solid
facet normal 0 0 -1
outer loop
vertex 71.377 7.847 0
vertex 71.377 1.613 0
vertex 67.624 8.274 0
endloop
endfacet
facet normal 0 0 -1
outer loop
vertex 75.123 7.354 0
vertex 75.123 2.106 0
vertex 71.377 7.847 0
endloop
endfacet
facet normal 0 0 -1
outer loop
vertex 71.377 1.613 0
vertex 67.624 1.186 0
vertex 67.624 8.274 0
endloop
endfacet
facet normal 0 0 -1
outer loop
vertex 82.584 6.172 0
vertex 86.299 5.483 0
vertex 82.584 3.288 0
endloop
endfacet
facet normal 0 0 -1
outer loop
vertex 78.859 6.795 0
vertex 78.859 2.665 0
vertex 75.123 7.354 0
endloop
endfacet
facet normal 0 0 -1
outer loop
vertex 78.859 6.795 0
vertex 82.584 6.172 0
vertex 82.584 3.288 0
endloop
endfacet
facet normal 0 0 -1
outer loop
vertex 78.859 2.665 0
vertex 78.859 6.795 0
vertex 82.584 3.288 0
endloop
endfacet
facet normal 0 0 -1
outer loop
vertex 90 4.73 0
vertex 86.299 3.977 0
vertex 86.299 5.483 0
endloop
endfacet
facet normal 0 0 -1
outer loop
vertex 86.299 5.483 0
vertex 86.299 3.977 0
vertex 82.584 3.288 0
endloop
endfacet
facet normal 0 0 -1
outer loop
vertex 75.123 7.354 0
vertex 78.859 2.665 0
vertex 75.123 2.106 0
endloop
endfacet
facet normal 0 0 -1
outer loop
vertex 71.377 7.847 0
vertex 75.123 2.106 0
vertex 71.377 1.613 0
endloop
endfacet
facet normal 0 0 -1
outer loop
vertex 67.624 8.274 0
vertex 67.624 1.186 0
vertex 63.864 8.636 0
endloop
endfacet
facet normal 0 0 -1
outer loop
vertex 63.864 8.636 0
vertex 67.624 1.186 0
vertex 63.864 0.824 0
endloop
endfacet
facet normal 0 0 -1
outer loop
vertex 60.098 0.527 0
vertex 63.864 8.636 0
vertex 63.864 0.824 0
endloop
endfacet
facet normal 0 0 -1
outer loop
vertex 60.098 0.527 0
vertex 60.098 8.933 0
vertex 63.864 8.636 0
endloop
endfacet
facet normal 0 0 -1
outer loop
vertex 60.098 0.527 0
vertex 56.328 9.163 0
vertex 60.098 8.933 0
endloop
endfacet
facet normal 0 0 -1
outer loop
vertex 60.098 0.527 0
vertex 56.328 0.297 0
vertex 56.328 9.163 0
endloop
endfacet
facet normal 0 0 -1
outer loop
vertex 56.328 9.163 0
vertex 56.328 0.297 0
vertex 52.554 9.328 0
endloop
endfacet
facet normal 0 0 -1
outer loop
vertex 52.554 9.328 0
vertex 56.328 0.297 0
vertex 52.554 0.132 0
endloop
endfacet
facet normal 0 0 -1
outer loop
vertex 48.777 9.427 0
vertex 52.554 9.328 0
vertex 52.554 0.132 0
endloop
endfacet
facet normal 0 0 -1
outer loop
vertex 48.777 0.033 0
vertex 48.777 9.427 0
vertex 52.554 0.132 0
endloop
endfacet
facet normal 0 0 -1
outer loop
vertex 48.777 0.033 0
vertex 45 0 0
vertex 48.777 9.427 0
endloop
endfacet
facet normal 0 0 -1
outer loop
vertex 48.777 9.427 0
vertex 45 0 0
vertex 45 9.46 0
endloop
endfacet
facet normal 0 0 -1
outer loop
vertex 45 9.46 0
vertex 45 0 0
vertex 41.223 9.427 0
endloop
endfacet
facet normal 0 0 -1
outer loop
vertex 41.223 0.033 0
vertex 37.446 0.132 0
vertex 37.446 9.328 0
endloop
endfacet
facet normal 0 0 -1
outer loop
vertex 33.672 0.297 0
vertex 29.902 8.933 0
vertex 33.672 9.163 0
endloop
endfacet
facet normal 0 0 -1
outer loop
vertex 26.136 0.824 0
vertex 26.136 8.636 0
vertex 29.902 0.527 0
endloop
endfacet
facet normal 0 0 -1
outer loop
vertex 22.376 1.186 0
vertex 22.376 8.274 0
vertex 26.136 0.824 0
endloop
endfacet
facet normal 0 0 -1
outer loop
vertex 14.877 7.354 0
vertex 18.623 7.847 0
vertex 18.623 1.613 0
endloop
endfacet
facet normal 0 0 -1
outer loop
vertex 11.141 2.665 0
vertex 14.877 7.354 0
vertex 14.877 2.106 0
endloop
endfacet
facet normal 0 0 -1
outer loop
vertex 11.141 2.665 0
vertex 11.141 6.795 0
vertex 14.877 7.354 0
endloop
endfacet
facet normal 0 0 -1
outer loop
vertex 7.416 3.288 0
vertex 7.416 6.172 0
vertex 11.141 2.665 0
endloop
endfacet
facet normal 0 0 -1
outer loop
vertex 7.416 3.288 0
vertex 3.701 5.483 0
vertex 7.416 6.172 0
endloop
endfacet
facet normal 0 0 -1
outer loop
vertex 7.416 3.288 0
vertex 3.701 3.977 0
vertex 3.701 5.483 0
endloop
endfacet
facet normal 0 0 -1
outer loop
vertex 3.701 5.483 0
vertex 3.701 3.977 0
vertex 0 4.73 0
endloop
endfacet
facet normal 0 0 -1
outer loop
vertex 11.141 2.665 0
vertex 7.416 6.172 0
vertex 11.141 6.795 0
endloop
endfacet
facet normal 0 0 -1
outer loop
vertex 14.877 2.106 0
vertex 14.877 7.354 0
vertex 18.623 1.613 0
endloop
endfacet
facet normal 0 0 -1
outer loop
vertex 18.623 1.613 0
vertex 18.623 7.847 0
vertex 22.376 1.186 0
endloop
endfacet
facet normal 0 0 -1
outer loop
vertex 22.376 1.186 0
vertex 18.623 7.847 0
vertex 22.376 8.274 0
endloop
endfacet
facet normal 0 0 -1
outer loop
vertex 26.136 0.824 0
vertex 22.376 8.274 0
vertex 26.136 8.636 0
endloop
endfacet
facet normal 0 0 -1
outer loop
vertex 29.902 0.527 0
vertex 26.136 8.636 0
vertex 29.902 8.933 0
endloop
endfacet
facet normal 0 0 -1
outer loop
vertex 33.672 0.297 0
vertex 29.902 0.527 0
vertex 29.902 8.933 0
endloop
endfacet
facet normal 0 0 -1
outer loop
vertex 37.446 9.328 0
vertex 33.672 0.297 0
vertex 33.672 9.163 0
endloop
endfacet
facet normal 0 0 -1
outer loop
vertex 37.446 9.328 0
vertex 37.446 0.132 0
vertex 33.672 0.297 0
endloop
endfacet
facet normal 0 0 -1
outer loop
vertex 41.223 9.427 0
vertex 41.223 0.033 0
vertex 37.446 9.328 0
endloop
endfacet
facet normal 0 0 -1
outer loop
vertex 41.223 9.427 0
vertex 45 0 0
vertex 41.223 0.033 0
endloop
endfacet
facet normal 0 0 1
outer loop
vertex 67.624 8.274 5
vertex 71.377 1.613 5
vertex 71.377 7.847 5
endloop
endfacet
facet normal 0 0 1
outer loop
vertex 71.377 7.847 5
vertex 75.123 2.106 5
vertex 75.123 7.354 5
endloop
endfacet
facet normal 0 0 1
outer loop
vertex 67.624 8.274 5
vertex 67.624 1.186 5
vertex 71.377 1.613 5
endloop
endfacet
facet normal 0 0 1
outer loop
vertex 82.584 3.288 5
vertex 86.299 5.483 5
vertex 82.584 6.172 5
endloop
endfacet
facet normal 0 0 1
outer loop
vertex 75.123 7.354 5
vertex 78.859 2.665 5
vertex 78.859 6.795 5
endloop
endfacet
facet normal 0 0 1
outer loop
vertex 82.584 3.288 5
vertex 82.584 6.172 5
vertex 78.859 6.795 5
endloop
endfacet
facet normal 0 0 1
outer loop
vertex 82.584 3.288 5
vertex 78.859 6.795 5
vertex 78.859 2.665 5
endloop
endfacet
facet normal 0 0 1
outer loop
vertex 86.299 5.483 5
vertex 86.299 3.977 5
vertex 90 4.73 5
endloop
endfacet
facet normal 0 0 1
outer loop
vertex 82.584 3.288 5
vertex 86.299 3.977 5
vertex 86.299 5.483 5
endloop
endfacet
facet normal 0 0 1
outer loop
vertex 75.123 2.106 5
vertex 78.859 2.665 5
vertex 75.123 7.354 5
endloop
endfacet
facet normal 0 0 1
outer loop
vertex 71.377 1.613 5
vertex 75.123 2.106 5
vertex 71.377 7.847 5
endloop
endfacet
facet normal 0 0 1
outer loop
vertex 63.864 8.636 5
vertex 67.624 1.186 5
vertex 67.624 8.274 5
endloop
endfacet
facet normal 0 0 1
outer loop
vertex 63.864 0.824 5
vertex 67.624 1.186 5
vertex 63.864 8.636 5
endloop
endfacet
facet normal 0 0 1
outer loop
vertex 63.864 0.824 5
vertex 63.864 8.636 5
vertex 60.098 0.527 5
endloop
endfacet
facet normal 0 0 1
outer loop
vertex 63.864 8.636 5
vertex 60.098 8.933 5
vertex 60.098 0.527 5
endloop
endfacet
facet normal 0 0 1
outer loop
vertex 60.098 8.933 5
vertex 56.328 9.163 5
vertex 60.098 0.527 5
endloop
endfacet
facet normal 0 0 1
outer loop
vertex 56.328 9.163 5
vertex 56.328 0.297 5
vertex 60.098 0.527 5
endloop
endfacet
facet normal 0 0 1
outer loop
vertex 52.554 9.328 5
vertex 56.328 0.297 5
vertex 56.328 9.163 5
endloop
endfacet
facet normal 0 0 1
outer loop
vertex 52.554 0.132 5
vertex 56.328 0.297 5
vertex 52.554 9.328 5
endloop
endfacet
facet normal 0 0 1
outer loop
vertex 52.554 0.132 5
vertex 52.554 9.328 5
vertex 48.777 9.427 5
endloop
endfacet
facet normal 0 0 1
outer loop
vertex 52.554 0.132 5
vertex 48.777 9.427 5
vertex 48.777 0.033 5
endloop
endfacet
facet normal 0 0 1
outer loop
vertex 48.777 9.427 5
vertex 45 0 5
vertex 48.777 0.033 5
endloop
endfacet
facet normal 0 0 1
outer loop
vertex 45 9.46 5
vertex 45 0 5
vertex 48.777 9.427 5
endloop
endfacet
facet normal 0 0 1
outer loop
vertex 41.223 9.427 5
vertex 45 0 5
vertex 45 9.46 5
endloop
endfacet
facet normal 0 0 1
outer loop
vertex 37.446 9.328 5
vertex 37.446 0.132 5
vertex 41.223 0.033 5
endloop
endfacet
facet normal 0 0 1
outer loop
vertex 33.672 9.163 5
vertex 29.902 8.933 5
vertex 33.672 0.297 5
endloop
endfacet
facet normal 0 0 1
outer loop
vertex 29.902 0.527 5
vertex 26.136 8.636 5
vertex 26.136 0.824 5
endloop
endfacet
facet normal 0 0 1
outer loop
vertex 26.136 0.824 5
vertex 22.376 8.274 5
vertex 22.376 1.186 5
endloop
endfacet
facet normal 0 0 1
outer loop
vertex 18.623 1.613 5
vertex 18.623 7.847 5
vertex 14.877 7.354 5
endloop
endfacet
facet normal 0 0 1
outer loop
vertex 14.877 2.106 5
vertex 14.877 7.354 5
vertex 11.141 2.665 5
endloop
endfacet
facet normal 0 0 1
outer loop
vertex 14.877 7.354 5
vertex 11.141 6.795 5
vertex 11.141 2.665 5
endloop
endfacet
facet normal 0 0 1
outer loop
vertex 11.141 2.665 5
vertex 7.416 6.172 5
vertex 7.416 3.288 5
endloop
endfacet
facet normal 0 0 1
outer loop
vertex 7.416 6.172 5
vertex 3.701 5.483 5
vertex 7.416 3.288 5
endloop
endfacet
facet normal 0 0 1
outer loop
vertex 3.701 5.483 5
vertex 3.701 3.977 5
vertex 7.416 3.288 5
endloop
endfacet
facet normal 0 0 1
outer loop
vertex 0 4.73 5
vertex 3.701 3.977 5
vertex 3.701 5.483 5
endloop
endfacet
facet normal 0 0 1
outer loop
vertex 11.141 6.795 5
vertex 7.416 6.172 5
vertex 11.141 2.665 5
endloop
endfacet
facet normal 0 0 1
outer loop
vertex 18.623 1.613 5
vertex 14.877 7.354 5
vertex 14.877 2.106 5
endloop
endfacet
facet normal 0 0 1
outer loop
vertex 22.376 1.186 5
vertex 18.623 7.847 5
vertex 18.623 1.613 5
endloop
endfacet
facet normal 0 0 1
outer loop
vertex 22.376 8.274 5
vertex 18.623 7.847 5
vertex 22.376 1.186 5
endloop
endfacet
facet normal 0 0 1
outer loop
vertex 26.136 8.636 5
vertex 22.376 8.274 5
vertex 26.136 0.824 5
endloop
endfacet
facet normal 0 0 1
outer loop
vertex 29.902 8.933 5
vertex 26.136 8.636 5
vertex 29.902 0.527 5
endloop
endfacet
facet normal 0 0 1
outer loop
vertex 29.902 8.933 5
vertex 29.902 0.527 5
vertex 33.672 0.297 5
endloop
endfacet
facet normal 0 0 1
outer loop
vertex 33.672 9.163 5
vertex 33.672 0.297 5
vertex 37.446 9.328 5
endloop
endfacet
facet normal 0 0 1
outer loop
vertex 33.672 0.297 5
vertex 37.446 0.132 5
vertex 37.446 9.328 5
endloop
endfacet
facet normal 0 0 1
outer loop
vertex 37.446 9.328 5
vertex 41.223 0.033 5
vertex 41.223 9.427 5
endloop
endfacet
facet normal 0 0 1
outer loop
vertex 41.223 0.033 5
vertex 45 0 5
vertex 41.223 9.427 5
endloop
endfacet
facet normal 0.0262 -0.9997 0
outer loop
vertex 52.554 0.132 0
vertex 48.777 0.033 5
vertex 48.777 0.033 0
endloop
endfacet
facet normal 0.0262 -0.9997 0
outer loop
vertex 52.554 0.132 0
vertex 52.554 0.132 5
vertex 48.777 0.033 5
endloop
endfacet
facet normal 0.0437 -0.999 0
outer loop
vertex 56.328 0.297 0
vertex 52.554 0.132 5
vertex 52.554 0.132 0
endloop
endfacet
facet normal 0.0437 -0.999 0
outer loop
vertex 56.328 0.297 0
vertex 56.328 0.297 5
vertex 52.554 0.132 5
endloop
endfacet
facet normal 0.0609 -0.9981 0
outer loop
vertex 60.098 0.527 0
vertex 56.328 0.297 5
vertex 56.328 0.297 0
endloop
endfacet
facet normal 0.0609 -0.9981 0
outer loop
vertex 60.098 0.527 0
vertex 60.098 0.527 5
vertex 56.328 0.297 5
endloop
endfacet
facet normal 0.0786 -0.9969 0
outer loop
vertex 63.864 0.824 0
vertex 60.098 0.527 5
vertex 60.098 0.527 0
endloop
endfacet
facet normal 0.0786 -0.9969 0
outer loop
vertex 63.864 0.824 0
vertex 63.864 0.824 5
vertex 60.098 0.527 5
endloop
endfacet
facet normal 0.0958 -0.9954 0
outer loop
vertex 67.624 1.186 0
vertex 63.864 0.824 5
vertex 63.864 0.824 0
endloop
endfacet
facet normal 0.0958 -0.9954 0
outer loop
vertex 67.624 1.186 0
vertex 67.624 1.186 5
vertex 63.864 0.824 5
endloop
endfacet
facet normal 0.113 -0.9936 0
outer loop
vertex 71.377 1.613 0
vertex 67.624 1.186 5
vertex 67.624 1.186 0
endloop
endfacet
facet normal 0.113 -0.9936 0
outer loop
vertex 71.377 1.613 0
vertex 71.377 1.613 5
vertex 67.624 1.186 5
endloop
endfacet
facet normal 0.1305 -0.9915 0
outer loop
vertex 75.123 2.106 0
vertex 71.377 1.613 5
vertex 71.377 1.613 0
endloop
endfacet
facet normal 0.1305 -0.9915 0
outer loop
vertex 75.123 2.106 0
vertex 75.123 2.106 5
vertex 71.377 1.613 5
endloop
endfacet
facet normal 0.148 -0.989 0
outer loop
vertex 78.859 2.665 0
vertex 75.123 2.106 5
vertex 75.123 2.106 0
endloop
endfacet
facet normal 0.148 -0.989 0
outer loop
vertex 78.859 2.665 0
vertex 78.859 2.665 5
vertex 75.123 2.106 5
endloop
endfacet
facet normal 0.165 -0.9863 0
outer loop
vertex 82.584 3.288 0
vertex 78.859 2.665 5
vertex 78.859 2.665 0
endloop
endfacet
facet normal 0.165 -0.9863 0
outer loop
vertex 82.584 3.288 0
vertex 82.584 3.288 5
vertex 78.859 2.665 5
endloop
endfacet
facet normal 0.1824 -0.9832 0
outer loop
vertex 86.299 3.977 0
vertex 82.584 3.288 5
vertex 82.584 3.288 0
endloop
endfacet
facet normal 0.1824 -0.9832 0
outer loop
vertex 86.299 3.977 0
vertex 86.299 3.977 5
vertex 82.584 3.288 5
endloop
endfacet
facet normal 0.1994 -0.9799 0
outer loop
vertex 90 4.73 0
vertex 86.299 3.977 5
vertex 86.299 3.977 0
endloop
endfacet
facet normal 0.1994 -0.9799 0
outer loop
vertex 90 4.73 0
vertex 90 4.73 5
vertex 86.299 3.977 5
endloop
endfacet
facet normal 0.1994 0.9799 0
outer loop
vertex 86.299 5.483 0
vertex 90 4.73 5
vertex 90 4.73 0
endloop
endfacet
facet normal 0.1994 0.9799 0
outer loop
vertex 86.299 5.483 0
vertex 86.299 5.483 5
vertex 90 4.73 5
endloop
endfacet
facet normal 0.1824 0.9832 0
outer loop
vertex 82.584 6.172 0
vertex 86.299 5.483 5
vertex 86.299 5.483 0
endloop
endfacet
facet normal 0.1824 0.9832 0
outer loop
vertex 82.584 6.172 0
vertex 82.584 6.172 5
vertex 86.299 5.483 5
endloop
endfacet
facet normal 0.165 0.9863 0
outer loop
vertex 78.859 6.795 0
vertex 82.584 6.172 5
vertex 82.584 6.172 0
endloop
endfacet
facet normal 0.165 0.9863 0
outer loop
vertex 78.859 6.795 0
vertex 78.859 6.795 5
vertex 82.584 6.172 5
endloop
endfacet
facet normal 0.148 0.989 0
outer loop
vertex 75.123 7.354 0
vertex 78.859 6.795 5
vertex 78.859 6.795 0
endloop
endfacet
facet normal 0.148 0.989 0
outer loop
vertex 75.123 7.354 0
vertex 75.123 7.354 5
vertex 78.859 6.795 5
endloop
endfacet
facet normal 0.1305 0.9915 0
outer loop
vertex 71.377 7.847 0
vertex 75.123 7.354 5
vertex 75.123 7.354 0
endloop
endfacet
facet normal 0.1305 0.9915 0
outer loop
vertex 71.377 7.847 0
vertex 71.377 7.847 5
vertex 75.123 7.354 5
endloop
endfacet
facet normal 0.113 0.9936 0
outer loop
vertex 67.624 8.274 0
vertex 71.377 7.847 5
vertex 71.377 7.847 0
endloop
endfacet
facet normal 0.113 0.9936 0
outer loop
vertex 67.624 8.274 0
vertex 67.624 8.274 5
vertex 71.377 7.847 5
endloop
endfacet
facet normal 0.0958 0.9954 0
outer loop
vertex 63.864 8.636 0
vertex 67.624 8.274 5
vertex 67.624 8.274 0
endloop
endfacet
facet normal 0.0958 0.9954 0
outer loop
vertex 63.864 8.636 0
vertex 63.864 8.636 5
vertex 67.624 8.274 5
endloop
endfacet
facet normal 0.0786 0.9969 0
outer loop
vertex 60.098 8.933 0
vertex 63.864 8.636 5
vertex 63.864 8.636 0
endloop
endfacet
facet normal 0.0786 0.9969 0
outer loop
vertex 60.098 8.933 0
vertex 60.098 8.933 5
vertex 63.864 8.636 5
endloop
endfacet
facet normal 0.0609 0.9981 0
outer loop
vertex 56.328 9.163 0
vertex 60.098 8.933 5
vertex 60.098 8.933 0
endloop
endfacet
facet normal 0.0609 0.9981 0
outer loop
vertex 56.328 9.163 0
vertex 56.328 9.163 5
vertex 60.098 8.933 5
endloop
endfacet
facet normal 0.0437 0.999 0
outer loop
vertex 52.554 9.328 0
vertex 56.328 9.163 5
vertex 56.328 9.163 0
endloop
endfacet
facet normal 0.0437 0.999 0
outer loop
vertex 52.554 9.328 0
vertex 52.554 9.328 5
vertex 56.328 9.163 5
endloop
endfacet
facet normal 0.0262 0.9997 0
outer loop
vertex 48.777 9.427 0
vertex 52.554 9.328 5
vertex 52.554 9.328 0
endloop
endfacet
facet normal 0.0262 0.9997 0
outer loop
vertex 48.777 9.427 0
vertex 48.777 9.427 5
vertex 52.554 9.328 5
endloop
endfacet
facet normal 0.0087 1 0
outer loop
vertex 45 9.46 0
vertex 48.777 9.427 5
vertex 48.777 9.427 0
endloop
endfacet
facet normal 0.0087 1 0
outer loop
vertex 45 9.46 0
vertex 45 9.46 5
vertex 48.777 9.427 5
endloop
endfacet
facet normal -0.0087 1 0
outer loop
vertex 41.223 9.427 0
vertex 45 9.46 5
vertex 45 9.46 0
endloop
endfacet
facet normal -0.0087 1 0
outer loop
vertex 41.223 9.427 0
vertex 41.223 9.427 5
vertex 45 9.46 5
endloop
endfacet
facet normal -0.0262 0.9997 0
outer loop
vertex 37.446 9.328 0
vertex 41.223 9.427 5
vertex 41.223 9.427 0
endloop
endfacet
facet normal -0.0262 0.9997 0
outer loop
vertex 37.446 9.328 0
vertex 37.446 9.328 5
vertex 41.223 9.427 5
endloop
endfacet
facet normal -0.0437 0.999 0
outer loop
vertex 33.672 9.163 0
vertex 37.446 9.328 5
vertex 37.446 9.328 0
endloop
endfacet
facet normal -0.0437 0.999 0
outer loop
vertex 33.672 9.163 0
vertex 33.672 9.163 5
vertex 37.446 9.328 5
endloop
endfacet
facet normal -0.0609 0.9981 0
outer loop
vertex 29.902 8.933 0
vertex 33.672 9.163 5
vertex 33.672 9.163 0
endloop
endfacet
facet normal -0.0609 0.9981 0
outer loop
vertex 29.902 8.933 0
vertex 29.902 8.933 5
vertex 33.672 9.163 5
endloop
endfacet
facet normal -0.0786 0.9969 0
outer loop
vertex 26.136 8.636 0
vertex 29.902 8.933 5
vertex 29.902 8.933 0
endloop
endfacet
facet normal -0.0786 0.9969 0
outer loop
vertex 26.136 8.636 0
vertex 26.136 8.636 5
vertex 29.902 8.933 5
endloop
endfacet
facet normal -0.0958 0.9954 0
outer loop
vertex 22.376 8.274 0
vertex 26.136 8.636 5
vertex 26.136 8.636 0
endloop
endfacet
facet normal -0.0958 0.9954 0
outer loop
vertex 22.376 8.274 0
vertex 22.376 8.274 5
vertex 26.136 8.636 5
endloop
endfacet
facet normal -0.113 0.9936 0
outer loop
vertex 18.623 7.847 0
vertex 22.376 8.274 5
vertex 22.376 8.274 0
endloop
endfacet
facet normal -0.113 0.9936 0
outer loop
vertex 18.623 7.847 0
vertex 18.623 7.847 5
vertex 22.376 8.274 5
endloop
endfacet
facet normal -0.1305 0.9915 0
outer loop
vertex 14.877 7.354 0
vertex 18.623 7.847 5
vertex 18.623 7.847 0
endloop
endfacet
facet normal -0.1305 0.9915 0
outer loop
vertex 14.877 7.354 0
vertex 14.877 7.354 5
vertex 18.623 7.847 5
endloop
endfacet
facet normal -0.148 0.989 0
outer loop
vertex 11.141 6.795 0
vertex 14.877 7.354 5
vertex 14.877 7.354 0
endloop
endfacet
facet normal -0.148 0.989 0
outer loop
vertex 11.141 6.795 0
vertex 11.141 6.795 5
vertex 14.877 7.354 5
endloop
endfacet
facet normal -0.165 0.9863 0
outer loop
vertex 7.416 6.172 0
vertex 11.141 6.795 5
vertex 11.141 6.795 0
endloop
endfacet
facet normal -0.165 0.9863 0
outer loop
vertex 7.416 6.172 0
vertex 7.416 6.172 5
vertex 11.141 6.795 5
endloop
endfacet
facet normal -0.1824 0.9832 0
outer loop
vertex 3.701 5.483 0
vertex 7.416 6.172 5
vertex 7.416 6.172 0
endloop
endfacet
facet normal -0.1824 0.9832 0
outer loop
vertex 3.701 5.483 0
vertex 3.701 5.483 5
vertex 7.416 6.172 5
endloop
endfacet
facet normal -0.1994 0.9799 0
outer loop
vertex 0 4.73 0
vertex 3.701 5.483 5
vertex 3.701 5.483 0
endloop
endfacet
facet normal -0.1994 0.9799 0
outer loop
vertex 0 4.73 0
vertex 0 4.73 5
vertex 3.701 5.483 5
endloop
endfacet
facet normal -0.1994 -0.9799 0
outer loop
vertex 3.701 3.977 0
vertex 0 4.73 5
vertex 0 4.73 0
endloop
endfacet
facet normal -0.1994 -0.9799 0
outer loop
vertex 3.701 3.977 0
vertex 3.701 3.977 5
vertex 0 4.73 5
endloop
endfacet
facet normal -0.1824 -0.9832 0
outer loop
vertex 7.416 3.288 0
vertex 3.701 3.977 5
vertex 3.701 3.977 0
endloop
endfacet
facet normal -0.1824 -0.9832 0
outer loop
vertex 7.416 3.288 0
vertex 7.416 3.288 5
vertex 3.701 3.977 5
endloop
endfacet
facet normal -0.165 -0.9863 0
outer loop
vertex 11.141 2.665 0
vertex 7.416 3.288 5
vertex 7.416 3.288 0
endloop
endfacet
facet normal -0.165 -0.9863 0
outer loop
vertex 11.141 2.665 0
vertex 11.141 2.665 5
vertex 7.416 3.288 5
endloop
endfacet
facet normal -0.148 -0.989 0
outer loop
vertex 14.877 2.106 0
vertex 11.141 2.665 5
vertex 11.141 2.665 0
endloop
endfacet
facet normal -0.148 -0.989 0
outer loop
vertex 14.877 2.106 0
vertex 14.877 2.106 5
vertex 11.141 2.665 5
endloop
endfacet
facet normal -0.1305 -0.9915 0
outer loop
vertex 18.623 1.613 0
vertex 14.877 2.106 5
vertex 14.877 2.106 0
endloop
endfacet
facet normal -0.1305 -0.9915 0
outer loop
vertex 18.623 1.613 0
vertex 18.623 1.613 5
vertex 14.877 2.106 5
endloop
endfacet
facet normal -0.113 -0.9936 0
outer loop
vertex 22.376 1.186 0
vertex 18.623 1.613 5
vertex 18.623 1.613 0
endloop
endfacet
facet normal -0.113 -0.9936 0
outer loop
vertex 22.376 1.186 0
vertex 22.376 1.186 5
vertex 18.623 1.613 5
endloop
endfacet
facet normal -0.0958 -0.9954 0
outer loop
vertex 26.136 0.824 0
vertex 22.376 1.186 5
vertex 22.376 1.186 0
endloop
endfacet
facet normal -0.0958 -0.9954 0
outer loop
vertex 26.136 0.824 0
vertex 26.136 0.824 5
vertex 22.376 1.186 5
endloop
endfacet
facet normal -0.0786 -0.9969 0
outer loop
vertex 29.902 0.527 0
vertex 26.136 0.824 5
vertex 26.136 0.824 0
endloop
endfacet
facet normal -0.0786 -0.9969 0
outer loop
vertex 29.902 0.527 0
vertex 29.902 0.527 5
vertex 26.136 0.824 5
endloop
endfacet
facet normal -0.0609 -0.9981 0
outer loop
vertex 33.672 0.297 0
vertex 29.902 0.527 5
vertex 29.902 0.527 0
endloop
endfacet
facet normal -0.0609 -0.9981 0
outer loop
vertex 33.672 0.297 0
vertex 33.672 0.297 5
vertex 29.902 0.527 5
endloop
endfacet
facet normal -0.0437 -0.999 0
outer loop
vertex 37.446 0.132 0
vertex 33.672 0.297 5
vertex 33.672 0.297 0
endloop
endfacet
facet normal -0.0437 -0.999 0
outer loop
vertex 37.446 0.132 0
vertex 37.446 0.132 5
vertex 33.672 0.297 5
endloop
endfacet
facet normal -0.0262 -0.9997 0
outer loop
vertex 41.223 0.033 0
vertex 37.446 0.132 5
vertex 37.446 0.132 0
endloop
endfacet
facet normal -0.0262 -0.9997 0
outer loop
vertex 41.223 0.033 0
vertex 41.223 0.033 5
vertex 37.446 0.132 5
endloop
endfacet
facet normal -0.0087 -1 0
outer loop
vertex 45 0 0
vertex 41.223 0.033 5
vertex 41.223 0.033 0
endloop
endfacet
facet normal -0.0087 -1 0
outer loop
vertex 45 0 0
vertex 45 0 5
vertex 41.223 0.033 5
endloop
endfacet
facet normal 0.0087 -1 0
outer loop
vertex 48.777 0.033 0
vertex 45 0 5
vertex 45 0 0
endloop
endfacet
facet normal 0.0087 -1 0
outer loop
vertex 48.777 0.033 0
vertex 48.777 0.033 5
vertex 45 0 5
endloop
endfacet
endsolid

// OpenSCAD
$fn = 32;

// ----------------------------------------------------------------------
// Arc profile plate: lens, 48 points
// ----------------------------------------------------------------------

// --- parameters (mm) ---
lens_chord = 90;          // chord length of the lens, X
arc_r = 216.44;           // radius of both arcs
arc_angle = 24;           // angle of each arc, degrees
sagitta = 4.73;           // bulge of each arc (half the lens height)
arc_step = 1;             // sampling step of the arcs, degrees
plate_t = 5;              // plate thickness, Z
fit_tol = 0.05;           // declared fit tolerance (prompt contract)
free_tol = 0.2;           // declared free tolerance (prompt contract)

bbox_y = 2 * sagitta;  // full lens height

profile = [[90, 4.73], [86.299, 5.483], [82.584, 6.172], [78.859, 6.795], [75.123, 7.354], [71.377, 7.847], [67.624, 8.274], [63.864, 8.636], [60.098, 8.933], [56.328, 9.163], [52.554, 9.328], [48.777, 9.427], [45, 9.46], [41.223, 9.427], [37.446, 9.328], [33.672, 9.163], [29.902, 8.933], [26.136, 8.636], [22.376, 8.274], [18.623, 7.847], [14.877, 7.354], [11.141, 6.795], [7.416, 6.172], [3.701, 5.483], [0, 4.73], [3.701, 3.977], [7.416, 3.288], [11.141, 2.665], [14.877, 2.106], [18.623, 1.613], [22.376, 1.186], [26.136, 0.824], [29.902, 0.527], [33.672, 0.297], [37.446, 0.132], [41.223, 0.033], [45, 0], [48.777, 0.033], [52.554, 0.132], [56.328, 0.297], [60.098, 0.527], [63.864, 0.824], [67.624, 1.186], [71.377, 1.613], [75.123, 2.106], [78.859, 2.665], [82.584, 3.288], [86.299, 3.977]];  // primary outline, 48 points, counter clockwise

// --- the one profile operation ---
linear_extrude(height = plate_t) polygon(points = profile);
